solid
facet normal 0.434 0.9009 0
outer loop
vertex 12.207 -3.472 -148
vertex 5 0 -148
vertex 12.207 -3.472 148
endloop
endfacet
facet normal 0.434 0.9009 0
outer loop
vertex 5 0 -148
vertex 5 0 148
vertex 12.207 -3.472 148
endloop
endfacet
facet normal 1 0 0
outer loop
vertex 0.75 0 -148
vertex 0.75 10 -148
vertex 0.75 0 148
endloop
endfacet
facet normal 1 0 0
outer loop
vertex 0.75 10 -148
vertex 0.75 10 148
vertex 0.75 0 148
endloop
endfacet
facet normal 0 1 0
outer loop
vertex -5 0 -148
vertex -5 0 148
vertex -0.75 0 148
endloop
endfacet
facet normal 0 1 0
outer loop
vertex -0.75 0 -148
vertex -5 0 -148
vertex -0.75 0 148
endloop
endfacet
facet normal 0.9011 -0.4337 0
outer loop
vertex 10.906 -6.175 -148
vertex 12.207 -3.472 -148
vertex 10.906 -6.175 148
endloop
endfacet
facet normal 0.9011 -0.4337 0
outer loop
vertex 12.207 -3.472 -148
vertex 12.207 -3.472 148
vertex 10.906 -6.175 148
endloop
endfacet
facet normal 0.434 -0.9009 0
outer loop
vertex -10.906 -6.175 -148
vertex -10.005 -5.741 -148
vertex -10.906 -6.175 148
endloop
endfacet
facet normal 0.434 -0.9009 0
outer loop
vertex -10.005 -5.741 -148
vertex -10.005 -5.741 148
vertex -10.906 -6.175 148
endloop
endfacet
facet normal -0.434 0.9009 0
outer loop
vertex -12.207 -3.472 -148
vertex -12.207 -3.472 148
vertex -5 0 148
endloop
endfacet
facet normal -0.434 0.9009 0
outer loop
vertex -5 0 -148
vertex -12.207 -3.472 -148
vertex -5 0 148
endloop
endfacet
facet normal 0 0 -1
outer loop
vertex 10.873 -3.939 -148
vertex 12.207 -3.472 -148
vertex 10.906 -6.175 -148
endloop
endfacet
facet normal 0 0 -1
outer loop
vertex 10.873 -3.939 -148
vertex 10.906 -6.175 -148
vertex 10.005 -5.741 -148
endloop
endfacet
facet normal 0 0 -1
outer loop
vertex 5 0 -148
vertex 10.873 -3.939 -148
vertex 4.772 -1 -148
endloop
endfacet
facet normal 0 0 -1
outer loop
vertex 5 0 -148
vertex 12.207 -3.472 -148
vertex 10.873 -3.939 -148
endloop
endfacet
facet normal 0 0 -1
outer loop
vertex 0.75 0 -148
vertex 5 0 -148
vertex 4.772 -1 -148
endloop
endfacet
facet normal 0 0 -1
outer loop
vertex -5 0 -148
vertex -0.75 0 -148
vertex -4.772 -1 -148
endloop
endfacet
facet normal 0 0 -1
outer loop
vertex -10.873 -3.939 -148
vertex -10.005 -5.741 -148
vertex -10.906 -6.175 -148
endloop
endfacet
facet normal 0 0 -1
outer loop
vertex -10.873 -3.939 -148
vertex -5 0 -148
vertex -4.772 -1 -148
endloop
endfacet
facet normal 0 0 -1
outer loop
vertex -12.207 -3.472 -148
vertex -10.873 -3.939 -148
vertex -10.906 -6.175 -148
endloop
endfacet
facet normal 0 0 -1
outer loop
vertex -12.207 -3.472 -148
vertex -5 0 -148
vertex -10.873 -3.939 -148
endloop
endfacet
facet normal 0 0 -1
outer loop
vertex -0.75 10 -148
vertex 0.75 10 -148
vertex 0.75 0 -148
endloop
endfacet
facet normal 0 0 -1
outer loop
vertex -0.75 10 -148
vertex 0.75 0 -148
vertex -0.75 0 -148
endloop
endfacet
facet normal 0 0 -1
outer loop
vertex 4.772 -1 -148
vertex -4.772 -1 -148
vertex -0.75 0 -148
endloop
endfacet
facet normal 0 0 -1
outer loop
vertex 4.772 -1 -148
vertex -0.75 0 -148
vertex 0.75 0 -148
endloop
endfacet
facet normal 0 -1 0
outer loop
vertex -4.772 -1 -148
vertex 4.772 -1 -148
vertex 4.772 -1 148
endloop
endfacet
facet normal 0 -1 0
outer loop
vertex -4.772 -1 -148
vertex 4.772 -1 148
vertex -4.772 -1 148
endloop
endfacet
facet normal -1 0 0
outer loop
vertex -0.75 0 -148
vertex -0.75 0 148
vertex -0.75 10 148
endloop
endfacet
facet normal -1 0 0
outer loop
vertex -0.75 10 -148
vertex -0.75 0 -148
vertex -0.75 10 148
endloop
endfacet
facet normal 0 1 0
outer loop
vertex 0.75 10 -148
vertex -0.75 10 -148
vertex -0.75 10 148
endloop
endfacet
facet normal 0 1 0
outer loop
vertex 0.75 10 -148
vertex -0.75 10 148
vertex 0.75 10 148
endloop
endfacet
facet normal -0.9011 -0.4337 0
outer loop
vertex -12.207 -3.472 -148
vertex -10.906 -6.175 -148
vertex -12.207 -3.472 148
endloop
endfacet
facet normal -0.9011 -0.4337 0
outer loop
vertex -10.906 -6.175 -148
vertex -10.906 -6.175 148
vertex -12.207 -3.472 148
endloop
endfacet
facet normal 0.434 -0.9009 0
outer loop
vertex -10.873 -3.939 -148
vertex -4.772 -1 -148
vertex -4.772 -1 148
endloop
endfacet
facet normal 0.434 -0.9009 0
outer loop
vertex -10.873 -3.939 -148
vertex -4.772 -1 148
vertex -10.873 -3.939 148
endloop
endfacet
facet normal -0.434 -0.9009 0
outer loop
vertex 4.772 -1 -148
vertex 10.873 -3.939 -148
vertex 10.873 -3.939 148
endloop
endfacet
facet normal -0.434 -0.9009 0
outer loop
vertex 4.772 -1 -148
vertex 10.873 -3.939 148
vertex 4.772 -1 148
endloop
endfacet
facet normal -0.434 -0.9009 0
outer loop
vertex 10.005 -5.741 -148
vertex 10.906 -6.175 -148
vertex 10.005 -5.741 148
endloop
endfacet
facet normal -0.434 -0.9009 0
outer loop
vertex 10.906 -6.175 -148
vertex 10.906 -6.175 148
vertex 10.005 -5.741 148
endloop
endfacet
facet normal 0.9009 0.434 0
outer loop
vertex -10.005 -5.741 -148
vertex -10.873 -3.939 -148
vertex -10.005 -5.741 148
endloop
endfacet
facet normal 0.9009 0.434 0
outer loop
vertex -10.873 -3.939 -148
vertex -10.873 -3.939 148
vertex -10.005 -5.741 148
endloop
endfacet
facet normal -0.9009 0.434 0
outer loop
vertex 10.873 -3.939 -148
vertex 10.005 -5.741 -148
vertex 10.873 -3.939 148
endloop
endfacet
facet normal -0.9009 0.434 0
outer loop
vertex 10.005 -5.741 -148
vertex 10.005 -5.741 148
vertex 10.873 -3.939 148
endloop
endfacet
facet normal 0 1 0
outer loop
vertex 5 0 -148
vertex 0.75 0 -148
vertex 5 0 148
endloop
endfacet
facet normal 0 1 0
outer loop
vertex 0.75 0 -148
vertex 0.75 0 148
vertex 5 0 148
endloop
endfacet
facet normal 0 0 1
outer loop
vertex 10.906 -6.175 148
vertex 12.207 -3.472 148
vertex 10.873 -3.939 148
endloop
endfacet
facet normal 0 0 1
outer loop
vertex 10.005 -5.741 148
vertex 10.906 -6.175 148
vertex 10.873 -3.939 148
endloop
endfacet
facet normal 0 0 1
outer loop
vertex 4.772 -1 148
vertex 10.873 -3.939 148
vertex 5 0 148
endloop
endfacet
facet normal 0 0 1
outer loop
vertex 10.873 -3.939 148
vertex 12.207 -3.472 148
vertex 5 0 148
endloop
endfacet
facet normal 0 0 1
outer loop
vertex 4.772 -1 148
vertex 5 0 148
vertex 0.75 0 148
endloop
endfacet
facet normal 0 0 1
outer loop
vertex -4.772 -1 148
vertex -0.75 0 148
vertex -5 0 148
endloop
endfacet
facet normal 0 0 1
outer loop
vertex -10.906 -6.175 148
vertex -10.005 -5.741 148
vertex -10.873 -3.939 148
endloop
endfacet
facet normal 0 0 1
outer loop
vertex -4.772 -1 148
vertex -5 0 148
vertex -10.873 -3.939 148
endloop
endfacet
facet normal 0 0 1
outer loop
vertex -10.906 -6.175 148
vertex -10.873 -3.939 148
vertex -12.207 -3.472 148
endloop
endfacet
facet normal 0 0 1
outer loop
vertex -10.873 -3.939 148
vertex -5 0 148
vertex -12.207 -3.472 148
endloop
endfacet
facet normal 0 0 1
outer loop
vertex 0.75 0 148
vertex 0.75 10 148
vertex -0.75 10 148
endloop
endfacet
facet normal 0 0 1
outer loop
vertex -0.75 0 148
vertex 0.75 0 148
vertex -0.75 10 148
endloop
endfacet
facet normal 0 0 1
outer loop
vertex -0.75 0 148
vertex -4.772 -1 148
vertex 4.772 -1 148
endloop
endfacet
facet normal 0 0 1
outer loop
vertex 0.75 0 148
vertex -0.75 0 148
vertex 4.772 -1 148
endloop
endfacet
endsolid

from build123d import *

# Parameters (mm, degrees)
EXTRUSION1_DEPTH = 148


with BuildPart() as part:
    # Esquisse1 → Extrusion1 (new body, symmetric)
    with BuildSketch(Plane.XY):
        Polygon((-0.75, 0), (-0.75, 10), (0.75, 10), (0.75, 0), (5, 0), (12.207425429, -3.47174577), (10.905520765, -6.174530306), (10.004592586, -5.740562084), (10.872529029, -3.938705727), (4.771707198, -1), (-4.771707198, -1), (-10.872529029, -3.938705727), (-10.004592586, -5.740562084), (-10.905520765, -6.174530306), (-12.207425429, -3.47174577), (-5, 0), align=None)
    extrude(amount=EXTRUSION1_DEPTH, both=True)


solid = part.part
